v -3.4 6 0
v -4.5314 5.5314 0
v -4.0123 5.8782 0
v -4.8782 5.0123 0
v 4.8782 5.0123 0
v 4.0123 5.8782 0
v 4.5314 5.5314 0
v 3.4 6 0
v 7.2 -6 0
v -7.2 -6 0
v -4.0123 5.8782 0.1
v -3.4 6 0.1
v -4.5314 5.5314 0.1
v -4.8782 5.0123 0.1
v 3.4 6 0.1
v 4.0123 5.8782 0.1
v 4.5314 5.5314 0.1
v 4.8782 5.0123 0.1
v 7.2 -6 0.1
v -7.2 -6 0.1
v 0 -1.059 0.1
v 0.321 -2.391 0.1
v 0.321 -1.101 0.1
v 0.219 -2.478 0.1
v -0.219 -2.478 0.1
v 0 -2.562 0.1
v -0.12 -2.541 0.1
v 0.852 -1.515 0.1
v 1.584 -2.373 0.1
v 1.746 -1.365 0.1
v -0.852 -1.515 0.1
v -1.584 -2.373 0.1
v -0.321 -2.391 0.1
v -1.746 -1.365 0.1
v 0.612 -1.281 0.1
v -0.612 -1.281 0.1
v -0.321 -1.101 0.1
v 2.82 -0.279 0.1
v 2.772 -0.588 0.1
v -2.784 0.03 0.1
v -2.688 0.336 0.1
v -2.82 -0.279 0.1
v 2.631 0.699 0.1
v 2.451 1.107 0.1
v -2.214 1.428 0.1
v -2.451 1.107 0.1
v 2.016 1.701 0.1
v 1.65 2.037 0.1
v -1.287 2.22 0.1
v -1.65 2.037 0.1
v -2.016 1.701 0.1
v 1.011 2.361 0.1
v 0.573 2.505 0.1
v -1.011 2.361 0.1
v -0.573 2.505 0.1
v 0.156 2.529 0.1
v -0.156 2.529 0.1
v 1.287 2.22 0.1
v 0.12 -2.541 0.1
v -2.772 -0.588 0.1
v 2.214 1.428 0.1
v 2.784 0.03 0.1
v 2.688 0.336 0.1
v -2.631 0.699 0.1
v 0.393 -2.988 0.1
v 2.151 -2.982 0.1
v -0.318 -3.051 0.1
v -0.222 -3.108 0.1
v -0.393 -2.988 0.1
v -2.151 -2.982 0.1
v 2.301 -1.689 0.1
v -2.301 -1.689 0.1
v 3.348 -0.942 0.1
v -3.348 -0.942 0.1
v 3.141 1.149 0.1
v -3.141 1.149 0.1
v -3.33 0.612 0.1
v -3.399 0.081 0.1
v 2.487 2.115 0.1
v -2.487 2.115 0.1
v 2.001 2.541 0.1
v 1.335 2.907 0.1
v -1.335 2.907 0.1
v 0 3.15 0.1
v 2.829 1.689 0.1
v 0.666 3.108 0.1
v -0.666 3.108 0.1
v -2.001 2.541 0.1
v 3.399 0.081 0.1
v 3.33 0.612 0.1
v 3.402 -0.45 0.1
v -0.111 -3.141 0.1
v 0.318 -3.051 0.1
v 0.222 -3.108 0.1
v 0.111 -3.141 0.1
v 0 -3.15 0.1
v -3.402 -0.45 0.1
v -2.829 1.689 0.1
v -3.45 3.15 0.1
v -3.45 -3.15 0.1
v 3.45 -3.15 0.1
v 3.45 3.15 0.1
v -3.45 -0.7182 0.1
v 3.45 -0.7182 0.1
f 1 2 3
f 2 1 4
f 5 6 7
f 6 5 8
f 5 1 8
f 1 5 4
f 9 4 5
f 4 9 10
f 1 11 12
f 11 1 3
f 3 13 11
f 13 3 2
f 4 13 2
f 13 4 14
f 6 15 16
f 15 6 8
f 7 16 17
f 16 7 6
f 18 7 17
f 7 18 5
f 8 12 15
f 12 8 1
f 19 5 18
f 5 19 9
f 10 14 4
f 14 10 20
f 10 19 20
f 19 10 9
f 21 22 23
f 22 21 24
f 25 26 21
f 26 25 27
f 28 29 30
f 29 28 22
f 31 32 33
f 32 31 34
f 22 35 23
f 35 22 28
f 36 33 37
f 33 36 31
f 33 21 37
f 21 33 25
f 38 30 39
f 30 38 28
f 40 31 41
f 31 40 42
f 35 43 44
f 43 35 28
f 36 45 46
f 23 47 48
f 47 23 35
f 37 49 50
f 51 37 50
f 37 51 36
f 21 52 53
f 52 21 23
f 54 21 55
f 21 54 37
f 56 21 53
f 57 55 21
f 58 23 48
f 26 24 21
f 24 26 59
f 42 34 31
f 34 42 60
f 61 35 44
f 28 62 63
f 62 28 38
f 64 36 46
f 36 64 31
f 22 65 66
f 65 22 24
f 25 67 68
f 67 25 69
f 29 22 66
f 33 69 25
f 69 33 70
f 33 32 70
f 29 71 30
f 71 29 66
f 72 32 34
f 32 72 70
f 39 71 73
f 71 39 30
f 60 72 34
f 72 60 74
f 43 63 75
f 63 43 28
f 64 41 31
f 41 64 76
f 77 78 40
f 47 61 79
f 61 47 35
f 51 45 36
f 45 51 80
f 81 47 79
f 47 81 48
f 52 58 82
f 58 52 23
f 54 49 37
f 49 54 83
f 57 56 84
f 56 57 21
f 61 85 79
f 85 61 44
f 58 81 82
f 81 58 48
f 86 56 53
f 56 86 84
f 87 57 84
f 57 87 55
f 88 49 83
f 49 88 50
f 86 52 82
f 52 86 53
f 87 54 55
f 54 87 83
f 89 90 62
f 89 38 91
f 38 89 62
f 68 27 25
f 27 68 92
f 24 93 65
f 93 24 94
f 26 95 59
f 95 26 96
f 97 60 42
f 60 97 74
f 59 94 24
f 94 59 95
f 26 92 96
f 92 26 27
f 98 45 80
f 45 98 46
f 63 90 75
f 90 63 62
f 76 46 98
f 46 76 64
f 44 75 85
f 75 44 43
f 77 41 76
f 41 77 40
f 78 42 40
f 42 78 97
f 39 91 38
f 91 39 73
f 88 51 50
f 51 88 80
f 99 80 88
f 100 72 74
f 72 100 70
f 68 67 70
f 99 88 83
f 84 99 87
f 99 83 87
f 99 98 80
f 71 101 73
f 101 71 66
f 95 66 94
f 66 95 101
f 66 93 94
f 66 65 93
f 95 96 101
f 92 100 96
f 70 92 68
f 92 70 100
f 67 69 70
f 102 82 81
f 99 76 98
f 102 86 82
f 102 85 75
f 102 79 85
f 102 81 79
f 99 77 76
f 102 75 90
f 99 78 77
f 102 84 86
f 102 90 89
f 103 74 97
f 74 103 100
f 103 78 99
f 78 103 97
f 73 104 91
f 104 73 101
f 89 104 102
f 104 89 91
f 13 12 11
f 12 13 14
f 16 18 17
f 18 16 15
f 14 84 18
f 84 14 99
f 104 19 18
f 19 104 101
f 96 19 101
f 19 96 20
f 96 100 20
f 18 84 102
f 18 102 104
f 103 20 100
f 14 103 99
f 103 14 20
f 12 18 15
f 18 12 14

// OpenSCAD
// file: ../p/3-16cyli.scad
use <../lib.scad>
function ldraw_lib__3_16cyli() = [
// 0 Cylinder 0.1875
// 0 Name: 3-16cyli.dat
// 0 Author: Mark Kennedy [mkennedy]
// 0 !LDRAW_ORG Primitive UPDATE 2005-01
// 0 !LICENSE Licensed under CC BY 2.0 and CC BY 4.0 : see CAreadme.txt
// 
// 0 BFC CERTIFY CCW
  [0,"BFC","CERTIFY"],
  [0,"BFC","CCW"],
// 
// 0 !HISTORY 2004-03-02 [PTadmin] Official Update 2004-01
// 0 !HISTORY 2004-12-11 [nielsk] Recreated using Primitive Generator, Edge lines fixed, BFC changed to CCW
// 0 !HISTORY 2005-12-28 [PTadmin] Official Update 2005-01
// 0 !HISTORY 2007-06-24 [PTadmin] Header formatted for Contributor Agreement
// 0 !HISTORY 2008-07-01 [PTadmin] Official Update 2008-01
// 
// 
// 4 16 .9239 1 .3827 .9239 0 .3827 1 0 0 1 1 0
  [4,16,.9239,1,.3827,.9239,0,.3827,1,0,0,1,1,0],
// 4 16 .7071 1 .7071 .7071 0 .7071 .9239 0 .3827 .9239 1 .3827
  [4,16,.7071,1,.7071,.7071,0,.7071,.9239,0,.3827,.9239,1,.3827],
// 4 16 .3827 1 .9239 .3827 0 .9239 .7071 0 .7071 .7071 1 .7071
  [4,16,.3827,1,.9239,.3827,0,.9239,.7071,0,.7071,.7071,1,.7071],
// 5 24 1 1 0 1 0 0 1 1 -.4142 .9239 1 .3827
  [5,24,1,1,0,1,0,0,1,1,-.4142,.9239,1,.3827],
// 5 24 .9239 1 .3827 .9239 0 .3827 1 1 0 .7071 1 .7071
  [5,24,.9239,1,.3827,.9239,0,.3827,1,1,0,.7071,1,.7071],
// 5 24 .7071 1 .7071 .7071 0 .7071 .9239 1 .3827 .3827 1 .9239
  [5,24,.7071,1,.7071,.7071,0,.7071,.9239,1,.3827,.3827,1,.9239],
// 5 24 .3827 1 .9239 .3827 0 .9239 .7071 1 .7071 0 1 1.0824
  [5,24,.3827,1,.9239,.3827,0,.9239,.7071,1,.7071,0,1,1.0824],
// 0
];
makepoly(ldraw_lib__3_16cyli(), line=0.2);
// file: ../p/3-16chrd.scad
use <../lib.scad>
function ldraw_lib__3_16chrd() = [
// 0 Chord 0.1875
// 0 Name: 3-16chrd.dat
// 0 Author: Niels Karsdorp [nielsk]
// 0 !LDRAW_ORG Primitive UPDATE 2009-01
// 0 !LICENSE Licensed under CC BY 2.0 and CC BY 4.0 : see CAreadme.txt
// 
// 0 BFC CERTIFY CCW
  [0,"BFC","CERTIFY"],
  [0,"BFC","CCW"],
// 
// 0 !HISTORY 2009-05-02 [PTadmin] Official Update 2009-01
// 
// 
// 4 16 1 0 0 0.9239 0 0.3827 0.7071 0 0.7071 0.3827 0 0.9239
  [4,16,1,0,0,0.9239,0,0.3827,0.7071,0,0.7071,0.3827,0,0.9239],
// 0
// 
];
makepoly(ldraw_lib__3_16chrd(), line=0.2);
// file: 004695c.scad
use <../lib.scad>
use <../p/3-16chrd.scad>
use <../p/3-16cyli.scad>
use <s/3004s60.scad>
function ldraw_lib__004695c() = [
// 0 Sticker Minifig Torso with Shell Logo 1971
// 0 Name: 004695c.dat
// 0 Author: J.C. Tchang [tchang]
// 0 !LDRAW_ORG Part UPDATE 2019-01
// 0 !LICENSE Licensed under CC BY 2.0 and CC BY 4.0 : see CAreadme.txt
// 
// 0 BFC CERTIFY CCW
  [0,"BFC","CERTIFY"],
  [0,"BFC","CCW"],
// 
// 0 !KEYWORDS Set 377
// 
// 0 !HISTORY 2014-06-21 [PTadmin] Official Update 2014-01
// 0 !HISTORY 2017-07-02 [cwdee] Use cylinder primitives with conditional lines
// 0 !HISTORY 2019-04-01 [MMR1988] Added missing condlines
// 0 !HISTORY 2019-06-28 [PTadmin] Official Update 2019-01
// 
// 
// 1 16 -8.5 0 11 0 0 -4 0 -1 0 4 0 0 3-16chrd.dat
  [1,16,-8.5,0,11,0,0,-4,0,-1,0,4,0,0, ldraw_lib__3_16chrd()],
// 1 16 8.5 0 11 0 0 4 0 -1 0 4 0 0 3-16chrd.dat
  [1,16,8.5,0,11,0,0,4,0,-1,0,4,0,0, ldraw_lib__3_16chrd()],
// 4 16 -12.1956 0 12.5308 -8.5 0 15 8.5 0 15 12.1956 0 12.5308
  [4,16,-12.1956,0,12.5308,-8.5,0,15,8.5,0,15,12.1956,0,12.5308],
// 4 16 12.1956 0 12.5308 18 0 -15 -18 0 -15 -12.1956 0 12.5308
  [4,16,12.1956,0,12.5308,18,0,-15,-18,0,-15,-12.1956,0,12.5308],
// 1 16 -8.5 0 11 0 0 -4 0 -0.25 0 4 0 0 3-16cyli.dat
  [1,16,-8.5,0,11,0,0,-4,0,-0.25,0,4,0,0, ldraw_lib__3_16cyli()],
// 1 16 8.5 0 11 0 0 4 0 -0.25 0 4 0 0 3-16cyli.dat
  [1,16,8.5,0,11,0,0,4,0,-0.25,0,4,0,0, ldraw_lib__3_16cyli()],
// 4 16 8.5 0 15 -8.5 0 15 -8.5 -0.25 15 8.5 -0.25 15
  [4,16,8.5,0,15,-8.5,0,15,-8.5,-0.25,15,8.5,-0.25,15],
// 4 16 12.1956 -0.25 12.5308 18 -0.25 -15 18 0 -15 12.1956 0 12.5308
  [4,16,12.1956,-0.25,12.5308,18,-0.25,-15,18,0,-15,12.1956,0,12.5308],
// 4 16 -12.1956 0 12.5308 -18 0 -15 -18 -0.25 -15 -12.1956 -0.25 12.5308
  [4,16,-12.1956,0,12.5308,-18,0,-15,-18,-0.25,-15,-12.1956,-0.25,12.5308],
// 4 16 18 -0.25 -15 -18 -0.25 -15 -18 0 -15 18 0 -15
  [4,16,18,-0.25,-15,-18,-0.25,-15,-18,0,-15,18,0,-15],
// 
// 1 15 0 -0.25 0 0.75 0 0 0 0 1 0 -0.75 0 s\3004s60.dat
  [1,15,0,-0.25,0,0.75,0,0,0,0,1,0,-0.75,0, ldraw_lib__s__3004s60()],
// 
// 1 15 -8.5 -0.25 11 0 0 -4 0 1 0 4 0 0 3-16chrd.dat
  [1,15,-8.5,-0.25,11,0,0,-4,0,1,0,4,0,0, ldraw_lib__3_16chrd()],
// 1 15 8.5 -0.25 11 0 0 4 0 1 0 4 0 0 3-16chrd.dat
  [1,15,8.5,-0.25,11,0,0,4,0,1,0,4,0,0, ldraw_lib__3_16chrd()],
// 4 15 12.1956 -0.25 12.5308 -12.1956 -0.25 12.5308 -8.625 -0.25 7.875 0 -0.25 7.875
  [4,15,12.1956,-0.25,12.5308,-12.1956,-0.25,12.5308,-8.625,-0.25,7.875,0,-0.25,7.875],
// 4 15 8.625 -0.25 -7.875 18 -0.25 -15 12.1956 -0.25 12.5308 8.625 -0.25 -1.7955
  [4,15,8.625,-0.25,-7.875,18,-0.25,-15,12.1956,-0.25,12.5308,8.625,-0.25,-1.7955],
// 4 15 18 -0.25 -15 8.625 -0.25 -7.875 0 -0.25 -7.875 -18 -0.25 -15
  [4,15,18,-0.25,-15,8.625,-0.25,-7.875,0,-0.25,-7.875,-18,-0.25,-15],
// 3 15 0 -0.25 -7.875 -8.625 -0.25 -7.875 -18 -0.25 -15
  [3,15,0,-0.25,-7.875,-8.625,-0.25,-7.875,-18,-0.25,-15],
// 3 15 12.1956 -0.25 12.5308 0 -0.25 7.875 8.625 -0.25 7.875
  [3,15,12.1956,-0.25,12.5308,0,-0.25,7.875,8.625,-0.25,7.875],
// 3 15 12.1956 -0.25 12.5308 8.625 -0.25 7.875 8.625 -0.25 -1.7955
  [3,15,12.1956,-0.25,12.5308,8.625,-0.25,7.875,8.625,-0.25,-1.7955],
// 3 15 -8.625 -0.25 -1.7955 -18 -0.25 -15 -8.625 -0.25 -7.875
  [3,15,-8.625,-0.25,-1.7955,-18,-0.25,-15,-8.625,-0.25,-7.875],
// 4 15 -18 -0.25 -15 -8.625 -0.25 -1.7955 -8.625 -0.25 7.875 -12.1956 -0.25 12.5308
  [4,15,-18,-0.25,-15,-8.625,-0.25,-1.7955,-8.625,-0.25,7.875,-12.1956,-0.25,12.5308],
// 4 15 -8.5 -0.25 15 -12.1956 -0.25 12.5308 12.1956 -0.25 12.5308 8.5 -0.25 15
  [4,15,-8.5,-0.25,15,-12.1956,-0.25,12.5308,12.1956,-0.25,12.5308,8.5,-0.25,15],
// 
// 5 24 12.1956 0 12.5308 12.1956 -0.25 12.5308 18 -0.25 -15 11.3284 0 13.8284
  [5,24,12.1956,0,12.5308,12.1956,-0.25,12.5308,18,-0.25,-15,11.3284,0,13.8284],
// 5 24 -12.1956 -0.25 12.5308 -12.1956 0 12.5308 -18 0 -15 -11.3284 0 13.8284
  [5,24,-12.1956,-0.25,12.5308,-12.1956,0,12.5308,-18,0,-15,-11.3284,0,13.8284],
];
makepoly(ldraw_lib__004695c(), line=0.2);
// main file
use <../lib.scad>
use <004695c.scad>
function ldraw_lib__004318a() = [
// 0 =Sticker Minifig Torso with Shell Logo 1971
// 0 Name: 004318a.dat
// 0 Author: Alex Taylor [anathema]
// 0 !LDRAW_ORG Part Alias UPDATE 2019-02
// 0 !LICENSE Licensed under CC BY 2.0 and CC BY 4.0 : see CAreadme.txt
// 
// 0 BFC CERTIFY CCW
  [0,"BFC","CERTIFY"],
  [0,"BFC","CCW"],
// 
// 0 !KEYWORDS set 601, set 604
// 
// 0 !HISTORY 2019-09-09 [PTadmin] Official Update 2019-02
// 
// 
// 1 16 0 0 0 1 0 0 0 1 0 0 0 1 004695c.dat
  [1,16,0,0,0,1,0,0,0,1,0,0,0,1, ldraw_lib__004695c()],
];
makepoly(ldraw_lib__004318a(), line=0.2);
